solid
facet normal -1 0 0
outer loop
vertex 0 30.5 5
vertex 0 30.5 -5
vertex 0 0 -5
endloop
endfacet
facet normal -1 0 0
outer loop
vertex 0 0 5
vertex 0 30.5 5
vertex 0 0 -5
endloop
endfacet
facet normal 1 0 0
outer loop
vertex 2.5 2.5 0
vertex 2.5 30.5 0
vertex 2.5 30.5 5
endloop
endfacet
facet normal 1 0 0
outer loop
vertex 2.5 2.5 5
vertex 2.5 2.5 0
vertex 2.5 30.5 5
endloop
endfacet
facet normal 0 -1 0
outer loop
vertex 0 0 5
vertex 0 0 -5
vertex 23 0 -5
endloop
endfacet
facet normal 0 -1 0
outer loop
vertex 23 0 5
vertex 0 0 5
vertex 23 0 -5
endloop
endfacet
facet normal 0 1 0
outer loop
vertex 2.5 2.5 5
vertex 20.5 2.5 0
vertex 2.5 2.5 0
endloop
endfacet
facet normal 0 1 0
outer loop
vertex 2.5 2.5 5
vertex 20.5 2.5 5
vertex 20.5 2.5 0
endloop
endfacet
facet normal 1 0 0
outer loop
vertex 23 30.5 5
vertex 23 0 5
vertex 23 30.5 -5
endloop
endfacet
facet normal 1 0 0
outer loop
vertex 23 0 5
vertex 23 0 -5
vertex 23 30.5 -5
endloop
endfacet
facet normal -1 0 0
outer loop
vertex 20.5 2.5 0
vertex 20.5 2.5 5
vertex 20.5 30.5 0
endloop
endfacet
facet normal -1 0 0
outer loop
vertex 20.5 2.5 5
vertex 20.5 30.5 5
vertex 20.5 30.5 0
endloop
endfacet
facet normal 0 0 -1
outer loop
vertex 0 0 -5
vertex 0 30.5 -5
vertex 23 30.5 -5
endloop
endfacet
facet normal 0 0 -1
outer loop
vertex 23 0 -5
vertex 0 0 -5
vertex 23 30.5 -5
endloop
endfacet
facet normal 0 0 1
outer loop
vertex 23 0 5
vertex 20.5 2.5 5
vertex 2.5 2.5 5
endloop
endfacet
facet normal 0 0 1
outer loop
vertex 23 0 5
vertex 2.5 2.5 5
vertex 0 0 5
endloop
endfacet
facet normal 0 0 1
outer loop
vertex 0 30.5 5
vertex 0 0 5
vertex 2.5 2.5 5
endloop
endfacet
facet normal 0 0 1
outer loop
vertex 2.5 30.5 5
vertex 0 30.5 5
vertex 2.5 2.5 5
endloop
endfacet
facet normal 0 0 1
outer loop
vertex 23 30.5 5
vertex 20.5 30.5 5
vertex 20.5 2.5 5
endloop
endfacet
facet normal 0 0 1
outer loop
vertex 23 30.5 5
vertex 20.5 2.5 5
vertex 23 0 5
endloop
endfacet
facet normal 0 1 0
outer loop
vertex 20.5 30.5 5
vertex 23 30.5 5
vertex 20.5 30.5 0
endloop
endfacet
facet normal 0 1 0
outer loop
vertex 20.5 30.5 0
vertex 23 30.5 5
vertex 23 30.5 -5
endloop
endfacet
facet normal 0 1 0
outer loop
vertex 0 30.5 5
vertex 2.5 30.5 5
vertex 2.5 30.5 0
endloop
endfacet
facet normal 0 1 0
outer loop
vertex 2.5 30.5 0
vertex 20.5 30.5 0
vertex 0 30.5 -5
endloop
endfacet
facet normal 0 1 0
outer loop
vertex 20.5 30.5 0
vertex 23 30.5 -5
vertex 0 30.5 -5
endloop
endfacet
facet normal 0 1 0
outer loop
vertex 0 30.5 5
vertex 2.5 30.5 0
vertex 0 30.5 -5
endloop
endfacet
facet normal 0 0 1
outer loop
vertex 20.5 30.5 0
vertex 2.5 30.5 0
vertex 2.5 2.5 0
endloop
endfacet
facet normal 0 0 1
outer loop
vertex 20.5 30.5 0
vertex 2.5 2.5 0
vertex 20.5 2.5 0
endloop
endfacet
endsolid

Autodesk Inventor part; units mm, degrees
sketch "Skizze1" plane through (0, 0, 0) normal (0, 0, 1) x (1, 0, 0)
  line L0 (0, 0) -> (23, 0)
  line L1 (23, 0) -> (23, 30.5)
  line L2 (23, 30.5) -> (0, 30.5)
  line L3 (0, 30.5) -> (0, 0)
  dimension "d0" = 23
  dimension "d1" = 30.5
extrude "Extrusion1" add sketch "Skizze1" along normal mid plane 10
sketch "Skizze2" plane through (0, 0, 5) normal (0, 0, 1) x (1, 0, 0)
  line L0 (2.5, 28) -> (20.5, 28)
  line L1 (20.5, 28) -> (20.5, 2.5)
  line L2 (20.5, 2.5) -> (2.5, 2.5)
  line L3 (2.5, 2.5) -> (2.5, 28)
  point P0 (0, 0)
  dimension "d4" = 18
  dimension "d5" = 25.5
extrude "Extrusion2" cut sketch "Skizze2" against normal blind 5
sketch "Skizze3" plane through (0, 30.5, 5) normal (0, 1, 0) x (1, 0, 0)
  line L0 (23, 0) -> (0, 0) projected
  line L1 (2.5, 5) -> (20.5, 5) projected
  line L2 (2.5, 0) -> (20.5, 0)
  line L3 (20.5, 0) -> (20.5, 5)
  line L4 (20.5, 5) -> (2.5, 5)
  line L5 (2.5, 5) -> (2.5, 0)
  point P0 (0, 5)
  dimension "d8" = 18
  dimension "d9" = 5
extrude "Extrusion3" cut sketch "Skizze3" against normal blind 5
properties part number "espverkleidung"
